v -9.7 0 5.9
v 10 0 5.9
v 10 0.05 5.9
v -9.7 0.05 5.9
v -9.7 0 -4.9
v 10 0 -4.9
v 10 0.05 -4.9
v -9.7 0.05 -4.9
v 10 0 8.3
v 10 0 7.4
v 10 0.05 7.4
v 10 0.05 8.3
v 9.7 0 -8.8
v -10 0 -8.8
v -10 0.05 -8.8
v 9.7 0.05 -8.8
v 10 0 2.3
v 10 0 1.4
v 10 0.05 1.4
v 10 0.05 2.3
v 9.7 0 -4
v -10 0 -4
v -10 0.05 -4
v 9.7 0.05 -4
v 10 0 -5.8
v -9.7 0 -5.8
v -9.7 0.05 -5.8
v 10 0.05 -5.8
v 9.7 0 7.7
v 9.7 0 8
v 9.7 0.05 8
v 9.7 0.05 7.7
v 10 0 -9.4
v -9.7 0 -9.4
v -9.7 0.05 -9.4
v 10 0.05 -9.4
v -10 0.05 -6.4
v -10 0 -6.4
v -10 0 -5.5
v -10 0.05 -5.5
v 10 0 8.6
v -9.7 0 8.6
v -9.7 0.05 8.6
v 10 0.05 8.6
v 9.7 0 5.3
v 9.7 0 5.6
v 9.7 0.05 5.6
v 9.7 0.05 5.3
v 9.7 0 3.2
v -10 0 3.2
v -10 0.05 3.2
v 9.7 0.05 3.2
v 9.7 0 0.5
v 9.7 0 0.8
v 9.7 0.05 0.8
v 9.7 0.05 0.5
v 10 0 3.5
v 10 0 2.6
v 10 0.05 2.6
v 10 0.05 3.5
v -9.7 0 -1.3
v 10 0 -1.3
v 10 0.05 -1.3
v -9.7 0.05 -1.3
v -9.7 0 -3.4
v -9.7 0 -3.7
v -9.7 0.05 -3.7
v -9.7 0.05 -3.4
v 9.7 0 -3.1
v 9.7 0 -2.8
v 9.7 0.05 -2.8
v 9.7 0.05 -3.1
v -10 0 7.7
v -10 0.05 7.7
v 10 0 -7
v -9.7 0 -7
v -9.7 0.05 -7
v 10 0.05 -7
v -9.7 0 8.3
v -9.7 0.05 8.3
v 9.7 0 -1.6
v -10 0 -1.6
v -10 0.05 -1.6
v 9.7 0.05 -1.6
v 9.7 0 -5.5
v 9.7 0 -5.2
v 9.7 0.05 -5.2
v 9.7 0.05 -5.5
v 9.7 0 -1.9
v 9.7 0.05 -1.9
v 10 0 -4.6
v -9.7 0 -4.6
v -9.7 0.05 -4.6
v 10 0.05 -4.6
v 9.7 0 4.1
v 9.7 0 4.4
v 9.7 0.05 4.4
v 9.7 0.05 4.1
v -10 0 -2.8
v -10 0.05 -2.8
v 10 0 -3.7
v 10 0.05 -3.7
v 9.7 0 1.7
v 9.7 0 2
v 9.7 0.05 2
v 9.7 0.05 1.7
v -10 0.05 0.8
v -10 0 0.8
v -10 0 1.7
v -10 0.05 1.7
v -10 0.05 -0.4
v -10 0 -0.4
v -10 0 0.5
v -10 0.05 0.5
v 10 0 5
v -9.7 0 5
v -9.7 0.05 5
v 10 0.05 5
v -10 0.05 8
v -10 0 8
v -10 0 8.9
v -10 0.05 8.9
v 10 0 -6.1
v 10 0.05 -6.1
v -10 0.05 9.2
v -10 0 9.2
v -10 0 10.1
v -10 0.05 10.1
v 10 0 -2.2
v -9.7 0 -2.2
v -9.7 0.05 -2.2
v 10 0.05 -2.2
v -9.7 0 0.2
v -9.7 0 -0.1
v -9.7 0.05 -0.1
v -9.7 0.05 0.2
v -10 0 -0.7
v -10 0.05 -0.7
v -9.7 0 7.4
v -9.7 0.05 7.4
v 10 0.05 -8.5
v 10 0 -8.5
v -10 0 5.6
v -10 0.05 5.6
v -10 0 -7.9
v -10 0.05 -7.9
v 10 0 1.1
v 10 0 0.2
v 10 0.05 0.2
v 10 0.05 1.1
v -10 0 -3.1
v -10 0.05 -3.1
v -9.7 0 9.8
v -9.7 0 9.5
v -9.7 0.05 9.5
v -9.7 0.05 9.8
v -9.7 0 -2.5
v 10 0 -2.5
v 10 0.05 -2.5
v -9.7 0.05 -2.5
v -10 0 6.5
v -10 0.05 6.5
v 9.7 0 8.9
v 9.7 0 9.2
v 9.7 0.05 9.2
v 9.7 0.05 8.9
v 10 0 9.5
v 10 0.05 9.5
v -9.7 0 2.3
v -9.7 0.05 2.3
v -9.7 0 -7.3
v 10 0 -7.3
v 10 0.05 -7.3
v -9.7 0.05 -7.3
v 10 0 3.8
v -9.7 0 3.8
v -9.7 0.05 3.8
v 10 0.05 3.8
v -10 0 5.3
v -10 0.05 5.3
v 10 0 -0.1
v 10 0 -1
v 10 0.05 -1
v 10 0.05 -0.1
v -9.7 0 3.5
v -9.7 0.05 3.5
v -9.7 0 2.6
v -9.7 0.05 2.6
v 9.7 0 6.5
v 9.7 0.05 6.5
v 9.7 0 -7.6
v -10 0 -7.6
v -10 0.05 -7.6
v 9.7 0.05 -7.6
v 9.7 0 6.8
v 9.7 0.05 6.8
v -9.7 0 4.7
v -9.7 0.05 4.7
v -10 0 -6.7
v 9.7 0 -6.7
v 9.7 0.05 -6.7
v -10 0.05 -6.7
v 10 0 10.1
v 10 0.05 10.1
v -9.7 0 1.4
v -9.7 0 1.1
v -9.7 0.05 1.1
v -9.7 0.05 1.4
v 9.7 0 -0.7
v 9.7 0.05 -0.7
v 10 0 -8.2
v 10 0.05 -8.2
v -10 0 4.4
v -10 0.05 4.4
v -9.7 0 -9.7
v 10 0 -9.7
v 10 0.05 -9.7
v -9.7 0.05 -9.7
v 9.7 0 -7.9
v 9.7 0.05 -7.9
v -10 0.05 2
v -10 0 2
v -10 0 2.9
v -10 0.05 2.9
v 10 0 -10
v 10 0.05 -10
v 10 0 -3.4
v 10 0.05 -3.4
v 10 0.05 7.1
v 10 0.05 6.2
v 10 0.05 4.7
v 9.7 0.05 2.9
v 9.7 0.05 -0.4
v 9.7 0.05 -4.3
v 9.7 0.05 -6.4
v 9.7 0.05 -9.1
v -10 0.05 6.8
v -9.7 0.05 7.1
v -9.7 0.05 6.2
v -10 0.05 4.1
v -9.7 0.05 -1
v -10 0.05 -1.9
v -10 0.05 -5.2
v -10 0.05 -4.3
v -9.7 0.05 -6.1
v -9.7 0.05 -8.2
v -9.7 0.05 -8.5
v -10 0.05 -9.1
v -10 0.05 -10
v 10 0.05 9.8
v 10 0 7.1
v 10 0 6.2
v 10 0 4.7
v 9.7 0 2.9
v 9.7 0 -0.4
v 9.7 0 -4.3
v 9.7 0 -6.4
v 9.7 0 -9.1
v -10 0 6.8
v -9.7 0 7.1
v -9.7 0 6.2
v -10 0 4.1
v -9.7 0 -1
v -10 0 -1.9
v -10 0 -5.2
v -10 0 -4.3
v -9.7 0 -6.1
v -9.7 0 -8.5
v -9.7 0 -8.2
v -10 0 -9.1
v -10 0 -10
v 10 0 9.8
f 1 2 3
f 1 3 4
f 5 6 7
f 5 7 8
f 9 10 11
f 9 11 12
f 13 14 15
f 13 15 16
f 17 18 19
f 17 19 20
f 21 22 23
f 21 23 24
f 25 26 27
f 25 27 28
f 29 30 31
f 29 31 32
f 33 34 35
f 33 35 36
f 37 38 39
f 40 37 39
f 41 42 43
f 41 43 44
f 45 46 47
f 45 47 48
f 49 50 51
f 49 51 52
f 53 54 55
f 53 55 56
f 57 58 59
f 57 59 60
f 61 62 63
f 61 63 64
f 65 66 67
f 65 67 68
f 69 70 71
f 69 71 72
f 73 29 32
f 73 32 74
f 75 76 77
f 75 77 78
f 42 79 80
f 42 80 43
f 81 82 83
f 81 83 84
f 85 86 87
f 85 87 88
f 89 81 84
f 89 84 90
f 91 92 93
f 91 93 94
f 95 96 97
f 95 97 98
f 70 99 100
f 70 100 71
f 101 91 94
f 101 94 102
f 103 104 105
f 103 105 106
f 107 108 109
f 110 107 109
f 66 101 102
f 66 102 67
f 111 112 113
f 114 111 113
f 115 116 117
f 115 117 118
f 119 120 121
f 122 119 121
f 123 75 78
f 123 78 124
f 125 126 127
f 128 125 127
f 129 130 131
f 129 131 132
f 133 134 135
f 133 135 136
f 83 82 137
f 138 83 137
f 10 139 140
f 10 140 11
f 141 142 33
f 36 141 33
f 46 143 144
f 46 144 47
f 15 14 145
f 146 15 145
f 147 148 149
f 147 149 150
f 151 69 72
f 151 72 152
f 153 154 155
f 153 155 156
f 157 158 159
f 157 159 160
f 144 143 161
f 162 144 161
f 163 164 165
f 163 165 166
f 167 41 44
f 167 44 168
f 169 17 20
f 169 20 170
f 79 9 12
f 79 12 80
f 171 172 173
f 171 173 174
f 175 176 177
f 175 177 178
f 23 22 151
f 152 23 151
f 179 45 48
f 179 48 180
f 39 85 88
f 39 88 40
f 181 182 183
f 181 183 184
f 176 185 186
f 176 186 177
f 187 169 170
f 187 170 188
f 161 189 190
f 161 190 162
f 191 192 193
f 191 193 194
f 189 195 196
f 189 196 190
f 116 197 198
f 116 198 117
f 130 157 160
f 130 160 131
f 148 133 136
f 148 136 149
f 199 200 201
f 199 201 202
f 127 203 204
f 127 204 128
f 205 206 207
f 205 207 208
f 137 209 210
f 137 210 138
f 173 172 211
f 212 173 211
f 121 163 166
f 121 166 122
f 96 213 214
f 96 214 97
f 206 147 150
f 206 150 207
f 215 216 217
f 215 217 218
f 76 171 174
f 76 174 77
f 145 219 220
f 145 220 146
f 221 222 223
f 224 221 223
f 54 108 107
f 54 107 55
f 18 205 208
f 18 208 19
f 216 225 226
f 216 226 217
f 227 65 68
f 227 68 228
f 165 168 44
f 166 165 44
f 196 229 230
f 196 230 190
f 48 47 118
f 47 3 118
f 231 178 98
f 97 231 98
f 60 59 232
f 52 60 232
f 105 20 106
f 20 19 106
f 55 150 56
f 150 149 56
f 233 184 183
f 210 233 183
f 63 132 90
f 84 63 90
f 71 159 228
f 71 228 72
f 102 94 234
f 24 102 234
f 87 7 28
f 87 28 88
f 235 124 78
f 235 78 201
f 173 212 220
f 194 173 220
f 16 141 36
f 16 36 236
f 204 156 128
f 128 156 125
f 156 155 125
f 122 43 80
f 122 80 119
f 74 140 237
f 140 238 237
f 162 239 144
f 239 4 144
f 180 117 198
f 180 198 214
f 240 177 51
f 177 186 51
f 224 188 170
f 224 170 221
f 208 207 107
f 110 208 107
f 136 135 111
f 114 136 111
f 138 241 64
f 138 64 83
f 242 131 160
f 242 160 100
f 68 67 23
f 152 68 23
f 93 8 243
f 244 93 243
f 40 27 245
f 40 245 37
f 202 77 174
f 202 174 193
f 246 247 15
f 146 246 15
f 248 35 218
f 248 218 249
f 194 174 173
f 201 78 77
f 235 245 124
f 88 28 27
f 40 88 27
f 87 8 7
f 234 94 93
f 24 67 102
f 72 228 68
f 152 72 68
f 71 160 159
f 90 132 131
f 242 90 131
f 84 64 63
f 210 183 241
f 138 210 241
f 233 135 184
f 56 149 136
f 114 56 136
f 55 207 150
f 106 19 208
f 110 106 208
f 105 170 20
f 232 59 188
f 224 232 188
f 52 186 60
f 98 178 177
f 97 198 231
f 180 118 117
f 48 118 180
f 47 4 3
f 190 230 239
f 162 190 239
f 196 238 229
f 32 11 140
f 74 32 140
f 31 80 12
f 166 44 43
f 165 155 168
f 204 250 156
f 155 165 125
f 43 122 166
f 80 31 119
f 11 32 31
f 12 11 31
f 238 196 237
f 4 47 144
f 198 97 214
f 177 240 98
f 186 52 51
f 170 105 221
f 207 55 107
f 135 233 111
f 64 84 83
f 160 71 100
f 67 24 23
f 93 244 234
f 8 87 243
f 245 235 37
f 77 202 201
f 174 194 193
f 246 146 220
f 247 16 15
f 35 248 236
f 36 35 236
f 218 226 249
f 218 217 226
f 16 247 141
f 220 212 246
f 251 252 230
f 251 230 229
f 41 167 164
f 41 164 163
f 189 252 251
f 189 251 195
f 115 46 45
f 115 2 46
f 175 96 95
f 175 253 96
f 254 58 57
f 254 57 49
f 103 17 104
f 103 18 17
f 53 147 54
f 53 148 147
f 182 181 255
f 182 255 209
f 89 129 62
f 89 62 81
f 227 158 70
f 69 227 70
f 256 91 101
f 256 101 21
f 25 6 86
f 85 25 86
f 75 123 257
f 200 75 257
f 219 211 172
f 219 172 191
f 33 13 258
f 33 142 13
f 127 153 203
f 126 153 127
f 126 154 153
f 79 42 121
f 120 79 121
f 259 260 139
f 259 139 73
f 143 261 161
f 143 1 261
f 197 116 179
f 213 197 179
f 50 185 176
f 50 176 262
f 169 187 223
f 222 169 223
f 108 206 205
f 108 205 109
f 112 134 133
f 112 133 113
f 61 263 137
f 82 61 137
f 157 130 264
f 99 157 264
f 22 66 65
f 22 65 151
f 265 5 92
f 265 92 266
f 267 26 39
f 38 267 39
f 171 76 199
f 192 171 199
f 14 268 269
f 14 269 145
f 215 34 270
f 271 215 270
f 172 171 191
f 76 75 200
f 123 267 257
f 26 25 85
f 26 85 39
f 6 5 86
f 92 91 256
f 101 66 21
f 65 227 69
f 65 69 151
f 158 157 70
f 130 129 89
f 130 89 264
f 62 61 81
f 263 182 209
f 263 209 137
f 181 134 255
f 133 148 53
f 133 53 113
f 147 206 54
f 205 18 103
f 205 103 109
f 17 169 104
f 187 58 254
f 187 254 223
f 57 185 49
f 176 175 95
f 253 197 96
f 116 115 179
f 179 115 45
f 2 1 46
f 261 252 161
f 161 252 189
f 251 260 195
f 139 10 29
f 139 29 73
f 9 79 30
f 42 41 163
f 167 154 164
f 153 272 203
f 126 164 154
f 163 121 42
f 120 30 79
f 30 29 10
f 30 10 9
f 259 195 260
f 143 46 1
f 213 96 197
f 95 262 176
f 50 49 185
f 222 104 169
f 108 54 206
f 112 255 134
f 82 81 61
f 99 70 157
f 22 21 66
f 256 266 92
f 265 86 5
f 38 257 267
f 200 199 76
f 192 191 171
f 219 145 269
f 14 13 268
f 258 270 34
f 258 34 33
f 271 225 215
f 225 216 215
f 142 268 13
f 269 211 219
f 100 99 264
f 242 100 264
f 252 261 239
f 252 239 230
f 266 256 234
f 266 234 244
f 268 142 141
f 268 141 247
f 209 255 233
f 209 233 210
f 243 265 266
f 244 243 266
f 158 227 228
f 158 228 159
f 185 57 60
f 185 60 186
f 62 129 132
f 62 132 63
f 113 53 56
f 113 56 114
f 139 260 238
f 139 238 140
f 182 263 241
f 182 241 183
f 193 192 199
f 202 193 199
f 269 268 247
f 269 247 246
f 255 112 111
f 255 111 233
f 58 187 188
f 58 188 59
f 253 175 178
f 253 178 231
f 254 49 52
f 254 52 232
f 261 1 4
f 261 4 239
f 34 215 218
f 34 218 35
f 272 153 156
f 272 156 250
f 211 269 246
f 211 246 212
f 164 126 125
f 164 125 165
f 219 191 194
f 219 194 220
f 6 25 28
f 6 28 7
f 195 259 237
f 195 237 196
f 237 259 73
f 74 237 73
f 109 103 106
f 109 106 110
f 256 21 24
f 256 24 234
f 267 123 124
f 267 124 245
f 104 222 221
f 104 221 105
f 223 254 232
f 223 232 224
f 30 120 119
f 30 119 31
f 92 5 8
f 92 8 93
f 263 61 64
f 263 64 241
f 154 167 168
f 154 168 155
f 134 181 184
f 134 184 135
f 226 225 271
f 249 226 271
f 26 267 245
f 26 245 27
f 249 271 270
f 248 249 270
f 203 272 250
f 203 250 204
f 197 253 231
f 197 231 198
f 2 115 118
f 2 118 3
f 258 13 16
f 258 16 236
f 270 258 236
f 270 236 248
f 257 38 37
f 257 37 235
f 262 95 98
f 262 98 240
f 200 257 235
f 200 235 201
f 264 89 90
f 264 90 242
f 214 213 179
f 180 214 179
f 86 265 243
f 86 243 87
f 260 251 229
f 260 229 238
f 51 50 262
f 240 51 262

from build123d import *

# Parameters (mm, degrees)
EXTRUDED_OBJECT_DEPTH = 0.05
BOSS_EXTRUDE1_DEPTH   = 0.05
LPATTERN1_COUNT       = 16
LPATTERN1_PITCH       = 1.2


with BuildPart() as part:
    # TopBlock → Extruded object (new body)
    with BuildSketch(Plane(origin=(0, 0, 0), x_dir=(1, 0, 0), z_dir=(0, 1, 0))):
        Polygon((-10, 10), (-9.7, 10), (10, 10), (10, 9.7), (-9.7, 9.7), (-9.7, 9.4), (10, 9.4), (10, 9.1), (-10, 9.1), (-10, 9.4), (-10, 9.7), align=None)
    extrude(amount=EXTRUDED_OBJECT_DEPTH)

    # Sketch2 → Boss-Extrude1 (add)
    with BuildSketch(Plane(origin=(0, 0, 0), x_dir=(1, 0, 0), z_dir=(0, 1, 0))):
        Polygon((10, 9.1), (10, 8.8), (10, 8.5), (-9.7, 8.5), (-9.7, 8.2), (10, 8.2), (10, 7.9), (-10, 7.9), (-10, 8.2), (-10, 8.5), (-10, 8.8), (9.7, 8.8), (9.7, 9.1), align=None)
    boss_extrude1 = extrude(amount=BOSS_EXTRUDE1_DEPTH)

    # LPattern1: Boss-Extrude1 ×16
    with Locations(*[(0, 0, i * LPATTERN1_PITCH) for i in range(1, LPATTERN1_COUNT)]):
        add(boss_extrude1)


solid = part.part
